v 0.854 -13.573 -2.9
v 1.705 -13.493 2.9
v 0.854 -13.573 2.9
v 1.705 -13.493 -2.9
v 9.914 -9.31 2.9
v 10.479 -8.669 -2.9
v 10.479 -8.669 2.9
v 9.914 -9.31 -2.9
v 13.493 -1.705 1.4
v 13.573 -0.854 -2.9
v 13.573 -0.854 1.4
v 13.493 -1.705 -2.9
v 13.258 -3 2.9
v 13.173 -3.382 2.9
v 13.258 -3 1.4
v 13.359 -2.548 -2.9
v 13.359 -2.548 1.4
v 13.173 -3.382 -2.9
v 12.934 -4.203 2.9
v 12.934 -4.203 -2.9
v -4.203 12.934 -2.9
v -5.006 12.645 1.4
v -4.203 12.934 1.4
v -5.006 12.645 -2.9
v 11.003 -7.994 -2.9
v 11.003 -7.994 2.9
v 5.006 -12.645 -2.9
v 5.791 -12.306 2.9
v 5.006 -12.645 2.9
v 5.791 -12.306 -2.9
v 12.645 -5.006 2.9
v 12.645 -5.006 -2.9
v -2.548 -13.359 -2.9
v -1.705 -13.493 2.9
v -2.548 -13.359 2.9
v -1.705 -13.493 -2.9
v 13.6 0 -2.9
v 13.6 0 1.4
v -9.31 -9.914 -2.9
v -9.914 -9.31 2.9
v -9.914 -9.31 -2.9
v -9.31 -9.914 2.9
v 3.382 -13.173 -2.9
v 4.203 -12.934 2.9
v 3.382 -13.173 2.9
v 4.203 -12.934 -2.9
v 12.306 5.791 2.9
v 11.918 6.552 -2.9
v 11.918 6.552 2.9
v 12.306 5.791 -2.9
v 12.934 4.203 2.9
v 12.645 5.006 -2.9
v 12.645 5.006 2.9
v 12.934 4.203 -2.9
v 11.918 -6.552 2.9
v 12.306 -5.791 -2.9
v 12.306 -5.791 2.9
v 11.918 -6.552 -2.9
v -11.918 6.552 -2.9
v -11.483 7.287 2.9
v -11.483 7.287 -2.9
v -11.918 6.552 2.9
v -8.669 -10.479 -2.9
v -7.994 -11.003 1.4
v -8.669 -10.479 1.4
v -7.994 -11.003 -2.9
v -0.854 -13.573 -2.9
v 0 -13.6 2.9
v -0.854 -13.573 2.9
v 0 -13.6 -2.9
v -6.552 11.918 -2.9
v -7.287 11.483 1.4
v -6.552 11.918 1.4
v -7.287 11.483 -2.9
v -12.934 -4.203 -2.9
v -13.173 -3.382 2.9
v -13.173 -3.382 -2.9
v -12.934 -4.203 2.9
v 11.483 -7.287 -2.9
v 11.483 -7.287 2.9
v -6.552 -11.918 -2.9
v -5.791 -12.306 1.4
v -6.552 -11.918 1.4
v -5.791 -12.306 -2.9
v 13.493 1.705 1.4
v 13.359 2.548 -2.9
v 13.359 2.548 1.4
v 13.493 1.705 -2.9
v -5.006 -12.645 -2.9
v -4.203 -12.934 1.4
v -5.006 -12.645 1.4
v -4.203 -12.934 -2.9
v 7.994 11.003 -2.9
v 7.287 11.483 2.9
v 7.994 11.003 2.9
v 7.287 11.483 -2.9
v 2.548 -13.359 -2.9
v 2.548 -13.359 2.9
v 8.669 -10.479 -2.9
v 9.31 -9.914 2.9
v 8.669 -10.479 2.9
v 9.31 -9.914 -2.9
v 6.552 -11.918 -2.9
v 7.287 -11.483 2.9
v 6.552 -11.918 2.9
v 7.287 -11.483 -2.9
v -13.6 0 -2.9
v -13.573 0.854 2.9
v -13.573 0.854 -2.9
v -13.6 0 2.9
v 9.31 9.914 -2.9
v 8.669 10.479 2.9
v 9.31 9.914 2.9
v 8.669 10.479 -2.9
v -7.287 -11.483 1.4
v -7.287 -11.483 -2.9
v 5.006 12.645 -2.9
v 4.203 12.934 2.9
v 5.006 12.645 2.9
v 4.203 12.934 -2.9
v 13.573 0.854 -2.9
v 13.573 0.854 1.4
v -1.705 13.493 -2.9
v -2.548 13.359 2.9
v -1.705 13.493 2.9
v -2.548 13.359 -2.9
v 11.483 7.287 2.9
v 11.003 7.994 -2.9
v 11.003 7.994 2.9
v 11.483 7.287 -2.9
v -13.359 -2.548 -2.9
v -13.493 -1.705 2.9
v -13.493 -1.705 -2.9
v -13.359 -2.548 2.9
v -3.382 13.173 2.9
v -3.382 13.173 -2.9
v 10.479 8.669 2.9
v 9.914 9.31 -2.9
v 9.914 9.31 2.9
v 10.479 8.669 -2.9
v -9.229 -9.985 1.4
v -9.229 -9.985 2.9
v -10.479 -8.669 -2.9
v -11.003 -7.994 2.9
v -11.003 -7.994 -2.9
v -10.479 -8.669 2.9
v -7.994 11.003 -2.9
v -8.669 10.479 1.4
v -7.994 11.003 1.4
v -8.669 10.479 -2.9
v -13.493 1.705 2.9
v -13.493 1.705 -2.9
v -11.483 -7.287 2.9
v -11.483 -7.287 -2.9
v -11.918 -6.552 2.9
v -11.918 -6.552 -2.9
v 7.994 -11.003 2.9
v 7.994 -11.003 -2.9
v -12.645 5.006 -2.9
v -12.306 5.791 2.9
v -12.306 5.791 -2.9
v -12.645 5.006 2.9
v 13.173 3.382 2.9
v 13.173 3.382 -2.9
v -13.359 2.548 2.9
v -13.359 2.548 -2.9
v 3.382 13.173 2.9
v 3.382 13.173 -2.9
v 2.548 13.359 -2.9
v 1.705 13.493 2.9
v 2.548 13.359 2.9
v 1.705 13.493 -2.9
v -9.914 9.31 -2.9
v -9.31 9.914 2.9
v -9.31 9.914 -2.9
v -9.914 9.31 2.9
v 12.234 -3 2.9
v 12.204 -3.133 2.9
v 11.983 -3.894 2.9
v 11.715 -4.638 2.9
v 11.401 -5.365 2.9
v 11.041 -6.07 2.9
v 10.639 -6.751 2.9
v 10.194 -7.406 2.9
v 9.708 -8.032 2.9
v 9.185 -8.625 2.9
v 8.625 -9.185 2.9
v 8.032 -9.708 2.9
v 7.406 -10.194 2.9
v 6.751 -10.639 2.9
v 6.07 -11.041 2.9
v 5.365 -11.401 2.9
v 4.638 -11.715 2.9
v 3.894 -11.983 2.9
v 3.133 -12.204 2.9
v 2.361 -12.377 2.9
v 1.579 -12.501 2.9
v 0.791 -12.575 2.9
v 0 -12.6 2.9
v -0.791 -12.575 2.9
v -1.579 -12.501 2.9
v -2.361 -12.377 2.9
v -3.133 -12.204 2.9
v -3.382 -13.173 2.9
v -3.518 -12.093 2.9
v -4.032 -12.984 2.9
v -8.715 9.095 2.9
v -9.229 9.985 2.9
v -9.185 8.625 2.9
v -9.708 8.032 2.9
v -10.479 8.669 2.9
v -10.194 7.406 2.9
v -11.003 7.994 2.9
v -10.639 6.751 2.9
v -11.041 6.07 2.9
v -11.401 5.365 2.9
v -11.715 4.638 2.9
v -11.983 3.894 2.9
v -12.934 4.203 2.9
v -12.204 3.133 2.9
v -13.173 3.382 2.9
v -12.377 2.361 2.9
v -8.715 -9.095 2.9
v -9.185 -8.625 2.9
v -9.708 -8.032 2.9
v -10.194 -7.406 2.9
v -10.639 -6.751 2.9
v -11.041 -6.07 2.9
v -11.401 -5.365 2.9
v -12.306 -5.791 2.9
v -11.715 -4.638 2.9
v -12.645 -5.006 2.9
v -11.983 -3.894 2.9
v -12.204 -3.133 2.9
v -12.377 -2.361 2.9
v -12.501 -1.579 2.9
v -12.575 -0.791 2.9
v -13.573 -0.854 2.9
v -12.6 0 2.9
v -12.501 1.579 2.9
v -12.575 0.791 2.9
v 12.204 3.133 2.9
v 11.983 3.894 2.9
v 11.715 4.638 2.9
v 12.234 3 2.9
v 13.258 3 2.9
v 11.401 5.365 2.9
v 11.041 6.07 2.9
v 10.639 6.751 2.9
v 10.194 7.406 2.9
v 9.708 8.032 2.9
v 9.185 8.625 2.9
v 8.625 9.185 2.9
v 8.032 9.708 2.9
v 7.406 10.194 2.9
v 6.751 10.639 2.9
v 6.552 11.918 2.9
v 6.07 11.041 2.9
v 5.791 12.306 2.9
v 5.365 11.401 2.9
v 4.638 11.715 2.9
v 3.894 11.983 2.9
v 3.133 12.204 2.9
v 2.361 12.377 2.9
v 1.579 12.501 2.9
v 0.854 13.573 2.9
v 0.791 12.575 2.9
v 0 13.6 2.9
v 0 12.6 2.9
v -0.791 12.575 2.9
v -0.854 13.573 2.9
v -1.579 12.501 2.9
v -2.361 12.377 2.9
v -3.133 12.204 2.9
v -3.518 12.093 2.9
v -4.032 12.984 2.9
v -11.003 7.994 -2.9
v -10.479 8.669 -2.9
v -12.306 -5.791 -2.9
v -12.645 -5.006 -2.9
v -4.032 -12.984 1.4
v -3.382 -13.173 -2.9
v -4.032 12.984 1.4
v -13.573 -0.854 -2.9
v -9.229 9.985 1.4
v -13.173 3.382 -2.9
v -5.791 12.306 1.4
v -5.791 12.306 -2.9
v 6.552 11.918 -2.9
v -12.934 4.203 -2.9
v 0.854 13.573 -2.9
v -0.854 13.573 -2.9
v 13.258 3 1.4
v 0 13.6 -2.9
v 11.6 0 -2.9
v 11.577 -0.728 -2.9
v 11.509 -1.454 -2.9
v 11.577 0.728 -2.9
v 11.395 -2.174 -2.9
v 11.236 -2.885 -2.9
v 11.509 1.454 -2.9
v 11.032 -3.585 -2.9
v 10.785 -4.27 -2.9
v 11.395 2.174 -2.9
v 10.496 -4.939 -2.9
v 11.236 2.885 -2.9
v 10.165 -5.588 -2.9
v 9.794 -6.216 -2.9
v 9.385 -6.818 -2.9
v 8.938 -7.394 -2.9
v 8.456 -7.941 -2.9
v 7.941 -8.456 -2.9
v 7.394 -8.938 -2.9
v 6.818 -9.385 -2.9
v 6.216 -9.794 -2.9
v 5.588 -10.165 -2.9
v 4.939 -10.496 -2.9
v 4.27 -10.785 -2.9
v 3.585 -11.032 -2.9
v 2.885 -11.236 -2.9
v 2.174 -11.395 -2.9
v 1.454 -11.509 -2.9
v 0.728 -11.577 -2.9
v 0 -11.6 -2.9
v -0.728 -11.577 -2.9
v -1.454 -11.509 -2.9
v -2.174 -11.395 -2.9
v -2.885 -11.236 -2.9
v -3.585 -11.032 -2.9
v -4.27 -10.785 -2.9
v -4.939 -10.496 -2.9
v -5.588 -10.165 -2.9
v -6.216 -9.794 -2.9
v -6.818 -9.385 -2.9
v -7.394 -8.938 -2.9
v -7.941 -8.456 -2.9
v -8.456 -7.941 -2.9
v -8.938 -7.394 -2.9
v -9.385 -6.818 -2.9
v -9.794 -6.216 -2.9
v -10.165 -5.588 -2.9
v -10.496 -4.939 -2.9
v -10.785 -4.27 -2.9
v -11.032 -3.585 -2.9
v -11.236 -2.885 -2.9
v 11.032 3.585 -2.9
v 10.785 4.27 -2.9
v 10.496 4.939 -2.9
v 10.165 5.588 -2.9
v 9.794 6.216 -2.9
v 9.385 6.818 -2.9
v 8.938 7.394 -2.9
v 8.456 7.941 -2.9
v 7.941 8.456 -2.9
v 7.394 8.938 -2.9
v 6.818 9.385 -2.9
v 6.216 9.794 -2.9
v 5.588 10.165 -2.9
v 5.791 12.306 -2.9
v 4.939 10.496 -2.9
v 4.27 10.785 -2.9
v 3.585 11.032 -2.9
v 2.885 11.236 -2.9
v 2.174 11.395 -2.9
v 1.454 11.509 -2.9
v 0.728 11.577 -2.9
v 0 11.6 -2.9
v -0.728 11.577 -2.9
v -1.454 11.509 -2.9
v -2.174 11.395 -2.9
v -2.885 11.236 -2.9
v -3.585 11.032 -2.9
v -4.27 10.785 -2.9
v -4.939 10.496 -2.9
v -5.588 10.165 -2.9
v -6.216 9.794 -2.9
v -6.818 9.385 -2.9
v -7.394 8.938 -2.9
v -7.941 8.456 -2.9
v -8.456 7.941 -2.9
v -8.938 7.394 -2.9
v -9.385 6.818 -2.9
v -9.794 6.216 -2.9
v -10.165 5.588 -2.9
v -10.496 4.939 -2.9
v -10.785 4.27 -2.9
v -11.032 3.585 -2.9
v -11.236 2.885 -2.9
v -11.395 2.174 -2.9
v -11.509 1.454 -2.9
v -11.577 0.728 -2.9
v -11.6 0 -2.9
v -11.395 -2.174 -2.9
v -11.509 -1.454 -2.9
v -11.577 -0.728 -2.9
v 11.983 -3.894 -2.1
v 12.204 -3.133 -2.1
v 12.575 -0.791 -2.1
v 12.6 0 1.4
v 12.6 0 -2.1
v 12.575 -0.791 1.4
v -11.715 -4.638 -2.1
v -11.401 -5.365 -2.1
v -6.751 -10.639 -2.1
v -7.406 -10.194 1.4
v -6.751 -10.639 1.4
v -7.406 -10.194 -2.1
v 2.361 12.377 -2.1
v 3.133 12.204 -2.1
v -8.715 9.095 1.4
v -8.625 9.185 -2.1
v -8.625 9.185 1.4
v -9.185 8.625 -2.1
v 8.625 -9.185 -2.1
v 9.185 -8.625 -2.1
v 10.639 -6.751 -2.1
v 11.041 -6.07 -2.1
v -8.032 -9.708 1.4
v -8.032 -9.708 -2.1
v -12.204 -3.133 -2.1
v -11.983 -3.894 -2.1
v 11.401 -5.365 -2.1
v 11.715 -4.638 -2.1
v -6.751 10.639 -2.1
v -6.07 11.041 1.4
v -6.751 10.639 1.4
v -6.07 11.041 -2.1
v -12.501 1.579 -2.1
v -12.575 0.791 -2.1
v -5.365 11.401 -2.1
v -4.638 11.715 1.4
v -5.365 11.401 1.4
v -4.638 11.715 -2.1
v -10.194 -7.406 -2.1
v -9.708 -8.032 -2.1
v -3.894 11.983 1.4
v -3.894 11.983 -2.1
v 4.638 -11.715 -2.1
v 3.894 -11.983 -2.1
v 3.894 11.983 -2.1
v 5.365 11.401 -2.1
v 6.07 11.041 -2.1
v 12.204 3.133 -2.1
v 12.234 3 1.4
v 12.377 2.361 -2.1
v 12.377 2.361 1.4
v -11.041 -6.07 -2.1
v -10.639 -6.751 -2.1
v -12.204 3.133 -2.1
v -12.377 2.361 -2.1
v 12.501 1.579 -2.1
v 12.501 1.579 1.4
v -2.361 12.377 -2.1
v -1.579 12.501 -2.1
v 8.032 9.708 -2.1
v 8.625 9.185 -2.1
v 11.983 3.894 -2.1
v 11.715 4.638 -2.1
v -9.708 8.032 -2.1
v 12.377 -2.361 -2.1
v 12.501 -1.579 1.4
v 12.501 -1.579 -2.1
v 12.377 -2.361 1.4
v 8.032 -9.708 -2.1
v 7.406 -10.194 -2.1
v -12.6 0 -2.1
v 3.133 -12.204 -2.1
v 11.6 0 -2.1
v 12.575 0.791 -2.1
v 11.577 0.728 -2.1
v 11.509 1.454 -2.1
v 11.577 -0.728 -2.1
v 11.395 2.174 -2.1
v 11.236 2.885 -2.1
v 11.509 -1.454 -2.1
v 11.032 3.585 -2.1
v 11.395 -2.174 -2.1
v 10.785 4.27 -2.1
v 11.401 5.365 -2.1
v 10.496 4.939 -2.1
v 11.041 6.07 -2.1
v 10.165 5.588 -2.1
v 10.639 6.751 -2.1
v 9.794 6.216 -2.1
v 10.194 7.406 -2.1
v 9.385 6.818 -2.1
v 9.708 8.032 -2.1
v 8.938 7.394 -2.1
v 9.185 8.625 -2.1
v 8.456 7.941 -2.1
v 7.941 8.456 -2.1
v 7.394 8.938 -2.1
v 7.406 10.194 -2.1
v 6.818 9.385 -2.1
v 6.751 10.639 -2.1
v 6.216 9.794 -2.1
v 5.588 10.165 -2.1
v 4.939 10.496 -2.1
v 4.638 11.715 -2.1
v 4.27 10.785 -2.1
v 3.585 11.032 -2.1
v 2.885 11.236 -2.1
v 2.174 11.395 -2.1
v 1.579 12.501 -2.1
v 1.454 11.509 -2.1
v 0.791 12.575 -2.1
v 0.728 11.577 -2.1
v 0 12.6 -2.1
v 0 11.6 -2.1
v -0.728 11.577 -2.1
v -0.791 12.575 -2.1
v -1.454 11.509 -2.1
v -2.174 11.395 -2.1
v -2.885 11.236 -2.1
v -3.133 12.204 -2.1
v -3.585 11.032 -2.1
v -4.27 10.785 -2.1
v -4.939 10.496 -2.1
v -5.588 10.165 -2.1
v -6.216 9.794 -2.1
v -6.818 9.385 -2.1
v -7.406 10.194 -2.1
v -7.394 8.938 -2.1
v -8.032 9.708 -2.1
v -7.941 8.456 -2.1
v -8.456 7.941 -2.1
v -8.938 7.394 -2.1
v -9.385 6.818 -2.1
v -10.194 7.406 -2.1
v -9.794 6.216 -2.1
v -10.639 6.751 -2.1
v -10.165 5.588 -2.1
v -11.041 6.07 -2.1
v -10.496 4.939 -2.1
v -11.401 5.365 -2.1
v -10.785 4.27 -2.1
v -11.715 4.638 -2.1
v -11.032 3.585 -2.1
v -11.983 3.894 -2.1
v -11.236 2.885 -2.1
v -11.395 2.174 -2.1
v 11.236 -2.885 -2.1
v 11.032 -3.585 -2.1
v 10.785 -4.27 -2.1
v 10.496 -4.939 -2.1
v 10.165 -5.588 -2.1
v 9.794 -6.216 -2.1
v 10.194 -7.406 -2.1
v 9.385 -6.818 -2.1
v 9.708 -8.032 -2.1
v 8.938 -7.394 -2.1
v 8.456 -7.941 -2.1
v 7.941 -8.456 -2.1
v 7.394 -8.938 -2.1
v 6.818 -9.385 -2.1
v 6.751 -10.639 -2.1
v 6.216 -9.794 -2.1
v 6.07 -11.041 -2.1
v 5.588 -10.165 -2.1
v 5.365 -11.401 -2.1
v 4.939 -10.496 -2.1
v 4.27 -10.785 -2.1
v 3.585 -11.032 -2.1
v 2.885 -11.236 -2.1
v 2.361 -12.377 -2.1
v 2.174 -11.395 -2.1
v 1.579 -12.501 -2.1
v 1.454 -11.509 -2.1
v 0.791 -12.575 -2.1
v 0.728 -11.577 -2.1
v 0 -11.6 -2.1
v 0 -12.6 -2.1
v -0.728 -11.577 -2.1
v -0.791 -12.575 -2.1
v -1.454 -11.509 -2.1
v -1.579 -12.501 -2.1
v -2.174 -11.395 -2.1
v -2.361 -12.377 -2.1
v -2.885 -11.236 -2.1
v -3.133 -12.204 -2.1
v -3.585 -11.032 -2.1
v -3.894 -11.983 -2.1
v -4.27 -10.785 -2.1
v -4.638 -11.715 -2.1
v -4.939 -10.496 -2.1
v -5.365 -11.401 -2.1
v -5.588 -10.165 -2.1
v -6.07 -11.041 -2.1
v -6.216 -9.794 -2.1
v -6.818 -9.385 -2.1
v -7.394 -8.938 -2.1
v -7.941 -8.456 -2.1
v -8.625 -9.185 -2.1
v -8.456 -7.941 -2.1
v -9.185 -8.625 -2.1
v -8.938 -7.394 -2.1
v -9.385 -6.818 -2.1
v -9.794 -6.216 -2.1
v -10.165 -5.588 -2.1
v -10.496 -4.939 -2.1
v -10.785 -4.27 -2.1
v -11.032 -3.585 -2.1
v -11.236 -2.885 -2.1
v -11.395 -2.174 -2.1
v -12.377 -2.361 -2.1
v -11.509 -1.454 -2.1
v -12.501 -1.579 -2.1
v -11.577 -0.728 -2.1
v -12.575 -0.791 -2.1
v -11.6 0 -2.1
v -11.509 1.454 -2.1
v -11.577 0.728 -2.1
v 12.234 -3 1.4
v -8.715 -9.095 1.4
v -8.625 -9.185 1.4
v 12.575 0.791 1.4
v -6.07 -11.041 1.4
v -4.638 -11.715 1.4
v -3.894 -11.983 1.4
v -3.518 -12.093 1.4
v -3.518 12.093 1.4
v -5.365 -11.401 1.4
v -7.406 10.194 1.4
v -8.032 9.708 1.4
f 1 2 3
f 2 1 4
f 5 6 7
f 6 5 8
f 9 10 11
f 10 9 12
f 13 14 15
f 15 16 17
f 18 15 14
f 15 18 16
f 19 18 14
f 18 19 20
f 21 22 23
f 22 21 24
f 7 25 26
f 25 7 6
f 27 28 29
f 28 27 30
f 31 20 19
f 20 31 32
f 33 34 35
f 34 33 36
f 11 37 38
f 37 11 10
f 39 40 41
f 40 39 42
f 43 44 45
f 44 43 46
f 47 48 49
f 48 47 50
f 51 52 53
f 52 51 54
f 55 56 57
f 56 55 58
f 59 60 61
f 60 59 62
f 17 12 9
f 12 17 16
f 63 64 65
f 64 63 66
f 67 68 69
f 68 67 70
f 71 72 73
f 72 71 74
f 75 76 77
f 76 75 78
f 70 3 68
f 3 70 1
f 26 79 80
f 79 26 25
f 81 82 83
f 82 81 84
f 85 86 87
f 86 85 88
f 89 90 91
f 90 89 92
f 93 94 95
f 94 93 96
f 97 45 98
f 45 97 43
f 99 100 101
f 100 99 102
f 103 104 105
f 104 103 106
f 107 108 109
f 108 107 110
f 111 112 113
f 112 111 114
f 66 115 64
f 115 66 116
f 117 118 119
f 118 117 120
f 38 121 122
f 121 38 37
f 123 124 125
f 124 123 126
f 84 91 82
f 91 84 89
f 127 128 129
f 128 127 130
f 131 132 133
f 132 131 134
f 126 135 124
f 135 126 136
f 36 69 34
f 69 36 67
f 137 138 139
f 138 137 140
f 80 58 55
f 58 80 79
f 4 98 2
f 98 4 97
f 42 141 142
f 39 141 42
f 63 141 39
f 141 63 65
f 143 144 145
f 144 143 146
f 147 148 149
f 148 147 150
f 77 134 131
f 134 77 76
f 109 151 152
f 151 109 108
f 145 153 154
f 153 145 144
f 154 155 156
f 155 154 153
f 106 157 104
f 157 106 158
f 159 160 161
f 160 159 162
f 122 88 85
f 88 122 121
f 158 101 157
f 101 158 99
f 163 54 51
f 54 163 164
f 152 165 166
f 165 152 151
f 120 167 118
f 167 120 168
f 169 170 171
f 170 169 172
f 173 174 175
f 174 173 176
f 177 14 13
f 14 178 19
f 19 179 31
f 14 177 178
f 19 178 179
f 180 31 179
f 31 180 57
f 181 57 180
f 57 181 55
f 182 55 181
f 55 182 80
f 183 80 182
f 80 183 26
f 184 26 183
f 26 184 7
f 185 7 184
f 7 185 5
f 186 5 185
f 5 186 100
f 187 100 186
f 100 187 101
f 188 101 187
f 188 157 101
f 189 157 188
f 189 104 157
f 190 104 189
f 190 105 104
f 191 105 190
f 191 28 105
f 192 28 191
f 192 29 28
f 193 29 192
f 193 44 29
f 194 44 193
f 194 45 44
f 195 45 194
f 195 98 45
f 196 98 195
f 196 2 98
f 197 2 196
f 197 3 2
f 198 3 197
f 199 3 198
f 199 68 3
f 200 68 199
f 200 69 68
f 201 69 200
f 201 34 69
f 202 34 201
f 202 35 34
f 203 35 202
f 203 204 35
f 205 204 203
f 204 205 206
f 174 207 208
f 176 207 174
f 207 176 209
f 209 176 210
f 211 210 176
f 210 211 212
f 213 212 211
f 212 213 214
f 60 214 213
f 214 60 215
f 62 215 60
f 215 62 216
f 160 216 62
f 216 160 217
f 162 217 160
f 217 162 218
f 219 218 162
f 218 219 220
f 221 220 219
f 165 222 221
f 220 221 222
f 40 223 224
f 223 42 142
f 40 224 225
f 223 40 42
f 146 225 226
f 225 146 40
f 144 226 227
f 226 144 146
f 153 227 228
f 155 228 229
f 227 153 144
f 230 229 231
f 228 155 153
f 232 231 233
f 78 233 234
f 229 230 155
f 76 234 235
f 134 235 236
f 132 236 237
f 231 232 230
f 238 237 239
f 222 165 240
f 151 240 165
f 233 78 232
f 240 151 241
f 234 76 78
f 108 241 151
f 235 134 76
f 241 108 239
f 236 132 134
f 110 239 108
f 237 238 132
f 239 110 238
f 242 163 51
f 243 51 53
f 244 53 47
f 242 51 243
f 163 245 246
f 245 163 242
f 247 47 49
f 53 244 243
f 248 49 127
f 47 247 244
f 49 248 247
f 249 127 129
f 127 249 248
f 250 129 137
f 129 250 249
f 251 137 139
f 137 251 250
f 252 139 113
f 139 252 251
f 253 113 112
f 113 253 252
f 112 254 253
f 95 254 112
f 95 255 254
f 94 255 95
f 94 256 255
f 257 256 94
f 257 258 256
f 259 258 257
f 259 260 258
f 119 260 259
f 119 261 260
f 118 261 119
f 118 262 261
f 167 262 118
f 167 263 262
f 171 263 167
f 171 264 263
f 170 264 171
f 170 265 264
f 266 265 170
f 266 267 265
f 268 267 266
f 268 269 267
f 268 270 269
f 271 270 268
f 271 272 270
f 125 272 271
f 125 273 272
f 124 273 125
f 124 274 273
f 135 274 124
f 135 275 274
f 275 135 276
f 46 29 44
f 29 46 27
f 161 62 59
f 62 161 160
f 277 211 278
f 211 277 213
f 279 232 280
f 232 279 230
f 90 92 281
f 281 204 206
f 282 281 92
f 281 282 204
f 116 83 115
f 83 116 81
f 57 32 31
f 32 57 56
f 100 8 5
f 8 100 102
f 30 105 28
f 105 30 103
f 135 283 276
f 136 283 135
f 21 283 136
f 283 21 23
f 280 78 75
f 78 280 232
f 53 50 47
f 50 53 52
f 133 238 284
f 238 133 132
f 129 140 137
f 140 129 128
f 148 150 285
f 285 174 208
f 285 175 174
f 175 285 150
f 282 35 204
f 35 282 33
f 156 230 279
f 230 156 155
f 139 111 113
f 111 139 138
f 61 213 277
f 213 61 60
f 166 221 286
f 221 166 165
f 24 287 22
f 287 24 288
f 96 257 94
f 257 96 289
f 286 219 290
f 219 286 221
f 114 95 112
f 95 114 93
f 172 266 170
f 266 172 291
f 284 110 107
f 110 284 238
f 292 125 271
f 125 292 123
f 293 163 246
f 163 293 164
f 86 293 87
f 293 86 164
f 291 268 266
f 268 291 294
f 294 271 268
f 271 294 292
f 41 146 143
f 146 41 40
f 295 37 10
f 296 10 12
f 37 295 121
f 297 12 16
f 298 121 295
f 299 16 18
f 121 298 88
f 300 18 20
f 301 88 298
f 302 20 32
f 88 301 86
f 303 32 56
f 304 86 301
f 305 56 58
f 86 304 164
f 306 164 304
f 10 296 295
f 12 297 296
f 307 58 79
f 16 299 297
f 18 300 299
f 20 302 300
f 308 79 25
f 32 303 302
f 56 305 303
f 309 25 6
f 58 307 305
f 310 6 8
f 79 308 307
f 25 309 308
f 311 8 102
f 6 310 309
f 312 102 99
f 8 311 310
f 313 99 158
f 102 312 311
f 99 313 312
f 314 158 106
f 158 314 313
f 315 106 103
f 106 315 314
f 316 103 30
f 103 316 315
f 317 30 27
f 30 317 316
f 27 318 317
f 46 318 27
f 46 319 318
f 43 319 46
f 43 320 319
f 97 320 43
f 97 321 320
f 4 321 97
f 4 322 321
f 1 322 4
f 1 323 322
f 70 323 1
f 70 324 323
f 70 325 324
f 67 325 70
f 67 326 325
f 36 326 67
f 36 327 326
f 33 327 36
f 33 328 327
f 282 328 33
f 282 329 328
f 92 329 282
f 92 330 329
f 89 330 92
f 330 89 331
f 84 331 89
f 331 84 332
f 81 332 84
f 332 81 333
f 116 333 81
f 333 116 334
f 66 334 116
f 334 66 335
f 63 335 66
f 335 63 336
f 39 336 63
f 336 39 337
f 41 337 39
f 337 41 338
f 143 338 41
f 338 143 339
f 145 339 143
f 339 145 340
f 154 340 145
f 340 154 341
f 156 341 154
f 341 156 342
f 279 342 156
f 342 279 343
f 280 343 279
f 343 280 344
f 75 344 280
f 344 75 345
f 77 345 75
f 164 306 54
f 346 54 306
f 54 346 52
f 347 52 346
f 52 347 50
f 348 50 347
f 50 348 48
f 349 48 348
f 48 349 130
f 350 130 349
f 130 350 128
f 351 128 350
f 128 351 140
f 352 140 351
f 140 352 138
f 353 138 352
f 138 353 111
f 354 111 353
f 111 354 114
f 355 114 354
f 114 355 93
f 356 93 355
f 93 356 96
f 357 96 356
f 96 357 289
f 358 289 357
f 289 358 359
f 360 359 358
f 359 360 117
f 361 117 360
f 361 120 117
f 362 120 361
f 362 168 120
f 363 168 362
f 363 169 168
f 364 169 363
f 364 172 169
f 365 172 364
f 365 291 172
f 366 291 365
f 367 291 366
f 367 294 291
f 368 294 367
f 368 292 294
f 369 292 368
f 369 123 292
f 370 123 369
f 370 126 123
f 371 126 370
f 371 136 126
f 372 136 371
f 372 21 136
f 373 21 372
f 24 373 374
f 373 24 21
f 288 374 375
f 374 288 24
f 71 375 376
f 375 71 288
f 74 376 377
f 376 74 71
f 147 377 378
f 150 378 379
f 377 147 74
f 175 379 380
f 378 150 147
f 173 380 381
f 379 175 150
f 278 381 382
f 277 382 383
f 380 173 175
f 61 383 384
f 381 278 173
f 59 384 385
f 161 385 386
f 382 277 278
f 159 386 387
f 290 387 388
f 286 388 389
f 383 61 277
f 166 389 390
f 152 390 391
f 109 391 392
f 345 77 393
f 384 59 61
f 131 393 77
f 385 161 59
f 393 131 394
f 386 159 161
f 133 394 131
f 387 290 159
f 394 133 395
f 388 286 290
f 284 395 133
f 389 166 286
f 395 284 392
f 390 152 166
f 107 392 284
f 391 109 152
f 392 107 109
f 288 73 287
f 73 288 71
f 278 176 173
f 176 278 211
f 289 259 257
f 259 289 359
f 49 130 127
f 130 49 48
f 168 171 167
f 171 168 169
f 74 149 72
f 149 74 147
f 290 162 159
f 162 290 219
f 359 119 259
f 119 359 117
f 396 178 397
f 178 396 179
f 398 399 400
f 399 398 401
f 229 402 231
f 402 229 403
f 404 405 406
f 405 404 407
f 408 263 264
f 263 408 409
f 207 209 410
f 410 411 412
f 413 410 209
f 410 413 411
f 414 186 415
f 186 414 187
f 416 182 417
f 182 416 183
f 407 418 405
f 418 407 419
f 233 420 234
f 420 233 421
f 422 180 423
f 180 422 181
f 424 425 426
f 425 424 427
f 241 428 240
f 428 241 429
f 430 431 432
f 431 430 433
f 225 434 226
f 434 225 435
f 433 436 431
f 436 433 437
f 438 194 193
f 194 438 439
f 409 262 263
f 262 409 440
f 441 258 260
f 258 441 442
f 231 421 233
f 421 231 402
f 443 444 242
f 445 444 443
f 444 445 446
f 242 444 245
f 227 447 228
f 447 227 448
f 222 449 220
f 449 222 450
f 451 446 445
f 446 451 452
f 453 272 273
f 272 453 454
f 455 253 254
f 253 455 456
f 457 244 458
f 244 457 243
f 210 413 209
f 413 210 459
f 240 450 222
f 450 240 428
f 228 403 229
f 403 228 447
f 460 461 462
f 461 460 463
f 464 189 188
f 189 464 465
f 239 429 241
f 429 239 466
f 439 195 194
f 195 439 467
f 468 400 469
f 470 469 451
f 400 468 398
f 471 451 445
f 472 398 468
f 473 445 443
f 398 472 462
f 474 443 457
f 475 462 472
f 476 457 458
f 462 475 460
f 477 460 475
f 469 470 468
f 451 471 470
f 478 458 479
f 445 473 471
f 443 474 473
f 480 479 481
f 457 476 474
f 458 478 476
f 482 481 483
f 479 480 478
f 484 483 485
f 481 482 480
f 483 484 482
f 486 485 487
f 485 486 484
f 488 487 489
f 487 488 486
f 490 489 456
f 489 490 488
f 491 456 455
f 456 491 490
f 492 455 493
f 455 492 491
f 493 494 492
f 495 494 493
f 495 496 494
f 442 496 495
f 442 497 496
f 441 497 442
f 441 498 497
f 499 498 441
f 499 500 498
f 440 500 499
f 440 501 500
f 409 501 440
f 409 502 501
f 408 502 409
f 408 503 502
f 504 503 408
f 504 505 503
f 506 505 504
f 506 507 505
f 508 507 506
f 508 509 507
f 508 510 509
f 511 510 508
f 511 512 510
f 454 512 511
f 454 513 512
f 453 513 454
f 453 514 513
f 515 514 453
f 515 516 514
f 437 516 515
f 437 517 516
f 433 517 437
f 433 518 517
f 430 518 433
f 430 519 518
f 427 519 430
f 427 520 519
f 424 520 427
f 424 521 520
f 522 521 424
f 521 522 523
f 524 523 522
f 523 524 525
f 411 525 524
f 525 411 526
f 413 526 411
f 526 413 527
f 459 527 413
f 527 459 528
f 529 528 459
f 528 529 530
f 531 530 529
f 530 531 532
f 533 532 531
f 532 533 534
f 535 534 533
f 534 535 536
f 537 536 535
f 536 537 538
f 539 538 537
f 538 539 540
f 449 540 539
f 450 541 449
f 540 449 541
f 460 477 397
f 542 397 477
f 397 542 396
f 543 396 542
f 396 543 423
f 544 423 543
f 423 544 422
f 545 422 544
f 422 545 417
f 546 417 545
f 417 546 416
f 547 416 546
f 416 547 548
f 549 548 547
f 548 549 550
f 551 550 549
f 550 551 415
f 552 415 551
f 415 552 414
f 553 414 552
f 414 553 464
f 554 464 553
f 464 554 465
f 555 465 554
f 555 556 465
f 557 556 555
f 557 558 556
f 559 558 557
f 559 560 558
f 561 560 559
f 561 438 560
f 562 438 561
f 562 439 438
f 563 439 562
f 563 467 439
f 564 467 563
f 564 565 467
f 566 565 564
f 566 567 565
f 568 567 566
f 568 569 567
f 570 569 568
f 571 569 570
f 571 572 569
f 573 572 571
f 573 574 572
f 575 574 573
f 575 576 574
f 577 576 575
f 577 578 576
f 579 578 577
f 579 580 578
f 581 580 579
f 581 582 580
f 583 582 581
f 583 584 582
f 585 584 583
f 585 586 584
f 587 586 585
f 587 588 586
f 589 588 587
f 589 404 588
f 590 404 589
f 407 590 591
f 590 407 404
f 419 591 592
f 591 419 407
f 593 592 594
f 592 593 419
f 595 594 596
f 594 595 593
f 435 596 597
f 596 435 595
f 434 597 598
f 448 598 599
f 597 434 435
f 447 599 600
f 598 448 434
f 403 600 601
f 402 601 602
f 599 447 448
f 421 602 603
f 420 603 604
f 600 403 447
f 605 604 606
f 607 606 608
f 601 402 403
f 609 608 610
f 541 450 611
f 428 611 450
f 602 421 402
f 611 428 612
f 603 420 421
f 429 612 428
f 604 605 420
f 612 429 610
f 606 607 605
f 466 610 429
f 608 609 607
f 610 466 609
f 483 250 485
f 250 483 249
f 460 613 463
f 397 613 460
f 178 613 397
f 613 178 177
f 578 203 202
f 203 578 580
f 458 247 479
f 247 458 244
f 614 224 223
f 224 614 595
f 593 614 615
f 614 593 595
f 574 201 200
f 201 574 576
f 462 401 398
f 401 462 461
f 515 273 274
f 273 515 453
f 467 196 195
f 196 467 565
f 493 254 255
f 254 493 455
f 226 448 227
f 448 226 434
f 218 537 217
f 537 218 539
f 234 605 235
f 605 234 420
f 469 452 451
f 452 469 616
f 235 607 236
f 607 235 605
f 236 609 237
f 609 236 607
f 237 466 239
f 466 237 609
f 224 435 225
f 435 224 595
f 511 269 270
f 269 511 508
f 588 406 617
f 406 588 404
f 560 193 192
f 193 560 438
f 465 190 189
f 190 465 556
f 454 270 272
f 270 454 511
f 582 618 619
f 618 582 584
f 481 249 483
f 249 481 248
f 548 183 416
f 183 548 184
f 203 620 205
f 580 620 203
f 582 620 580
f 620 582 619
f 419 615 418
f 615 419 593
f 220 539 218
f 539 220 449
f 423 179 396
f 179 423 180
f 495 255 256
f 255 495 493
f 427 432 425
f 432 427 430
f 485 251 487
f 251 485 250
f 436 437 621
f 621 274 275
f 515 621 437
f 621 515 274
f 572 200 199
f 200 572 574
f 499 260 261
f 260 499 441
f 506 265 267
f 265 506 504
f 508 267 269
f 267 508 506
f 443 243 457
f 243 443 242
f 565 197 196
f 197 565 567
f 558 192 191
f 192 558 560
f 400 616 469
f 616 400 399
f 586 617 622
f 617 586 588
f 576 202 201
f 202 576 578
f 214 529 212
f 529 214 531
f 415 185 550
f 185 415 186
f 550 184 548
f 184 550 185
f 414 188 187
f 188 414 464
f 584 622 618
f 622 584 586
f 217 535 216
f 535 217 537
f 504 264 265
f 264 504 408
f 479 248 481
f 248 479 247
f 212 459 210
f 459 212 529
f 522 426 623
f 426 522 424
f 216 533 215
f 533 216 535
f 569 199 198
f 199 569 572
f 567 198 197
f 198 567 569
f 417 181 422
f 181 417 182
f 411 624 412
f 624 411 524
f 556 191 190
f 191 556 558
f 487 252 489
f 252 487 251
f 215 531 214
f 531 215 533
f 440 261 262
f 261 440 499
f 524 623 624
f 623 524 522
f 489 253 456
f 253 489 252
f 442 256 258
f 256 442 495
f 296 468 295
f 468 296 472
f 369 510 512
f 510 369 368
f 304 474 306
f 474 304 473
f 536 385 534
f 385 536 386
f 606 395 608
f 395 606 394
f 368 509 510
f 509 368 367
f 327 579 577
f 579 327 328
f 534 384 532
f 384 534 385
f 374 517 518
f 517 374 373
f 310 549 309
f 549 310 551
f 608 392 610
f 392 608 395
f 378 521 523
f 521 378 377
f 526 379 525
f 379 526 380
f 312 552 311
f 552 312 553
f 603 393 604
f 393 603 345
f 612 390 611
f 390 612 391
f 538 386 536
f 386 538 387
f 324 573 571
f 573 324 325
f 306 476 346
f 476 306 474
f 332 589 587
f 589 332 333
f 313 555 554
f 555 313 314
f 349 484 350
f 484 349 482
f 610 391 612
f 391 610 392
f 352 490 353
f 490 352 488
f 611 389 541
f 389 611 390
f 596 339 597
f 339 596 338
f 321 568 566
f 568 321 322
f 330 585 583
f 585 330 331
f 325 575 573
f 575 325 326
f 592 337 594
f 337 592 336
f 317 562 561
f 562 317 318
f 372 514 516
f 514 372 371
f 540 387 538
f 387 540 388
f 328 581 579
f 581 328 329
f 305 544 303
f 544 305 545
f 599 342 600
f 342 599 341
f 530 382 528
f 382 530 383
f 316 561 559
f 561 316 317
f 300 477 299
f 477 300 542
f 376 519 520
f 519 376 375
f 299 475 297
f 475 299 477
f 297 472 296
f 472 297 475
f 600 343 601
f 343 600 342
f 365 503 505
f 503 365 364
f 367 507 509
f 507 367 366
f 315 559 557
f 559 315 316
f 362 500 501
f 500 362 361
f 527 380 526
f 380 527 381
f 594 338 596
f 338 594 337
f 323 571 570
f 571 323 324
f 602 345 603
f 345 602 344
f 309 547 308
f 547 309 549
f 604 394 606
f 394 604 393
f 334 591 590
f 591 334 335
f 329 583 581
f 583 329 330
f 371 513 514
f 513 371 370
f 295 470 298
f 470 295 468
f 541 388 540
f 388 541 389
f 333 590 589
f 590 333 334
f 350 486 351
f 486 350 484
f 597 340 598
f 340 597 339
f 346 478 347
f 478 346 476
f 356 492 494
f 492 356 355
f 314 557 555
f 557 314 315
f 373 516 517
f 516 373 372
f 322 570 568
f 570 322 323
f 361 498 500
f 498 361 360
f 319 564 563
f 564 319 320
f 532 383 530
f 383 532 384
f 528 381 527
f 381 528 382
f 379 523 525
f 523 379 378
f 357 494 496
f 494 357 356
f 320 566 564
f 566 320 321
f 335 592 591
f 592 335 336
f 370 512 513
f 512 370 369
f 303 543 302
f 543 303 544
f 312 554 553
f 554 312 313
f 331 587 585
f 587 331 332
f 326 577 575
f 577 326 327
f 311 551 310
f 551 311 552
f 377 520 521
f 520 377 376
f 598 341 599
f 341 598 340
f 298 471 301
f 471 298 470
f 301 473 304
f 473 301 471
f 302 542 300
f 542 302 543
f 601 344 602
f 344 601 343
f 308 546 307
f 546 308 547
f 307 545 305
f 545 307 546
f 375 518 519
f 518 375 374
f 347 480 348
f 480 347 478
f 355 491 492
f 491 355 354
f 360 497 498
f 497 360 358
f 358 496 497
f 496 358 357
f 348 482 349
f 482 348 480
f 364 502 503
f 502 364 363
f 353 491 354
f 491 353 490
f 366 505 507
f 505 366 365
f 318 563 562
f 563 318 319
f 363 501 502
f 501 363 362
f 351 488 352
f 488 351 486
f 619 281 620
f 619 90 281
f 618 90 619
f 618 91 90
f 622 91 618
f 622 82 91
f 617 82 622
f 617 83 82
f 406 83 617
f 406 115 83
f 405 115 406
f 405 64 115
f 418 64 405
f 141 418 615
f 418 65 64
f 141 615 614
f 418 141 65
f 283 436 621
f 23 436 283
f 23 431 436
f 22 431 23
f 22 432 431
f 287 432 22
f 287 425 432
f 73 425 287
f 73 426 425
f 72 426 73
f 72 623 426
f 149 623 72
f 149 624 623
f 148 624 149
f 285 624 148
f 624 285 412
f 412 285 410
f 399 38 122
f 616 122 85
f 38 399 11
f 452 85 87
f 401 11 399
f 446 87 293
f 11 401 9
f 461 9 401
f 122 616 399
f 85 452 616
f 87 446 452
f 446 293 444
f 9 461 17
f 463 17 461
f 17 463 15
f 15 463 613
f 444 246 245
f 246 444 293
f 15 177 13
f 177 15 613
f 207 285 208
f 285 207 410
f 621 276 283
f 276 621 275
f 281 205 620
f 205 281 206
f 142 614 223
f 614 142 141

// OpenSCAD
/*
    
    With this code you can make a filter holder to attach it to the lens focus wheel used for the camera in the FluoPi project.
    
    Isaac Núñez 2020 (CC BY 4.0; https://creativecommons.org/licenses/by/4.0/) 
 
*/

////////////////
// Parameters //


rf = 12.6;   //filter radius
side_thick = 1 ;
filter_thick = 3;
filter_free_space = 0.5; // in z axis, between the filter and the lens 
bottom_thick = 0.8; //the layer that support the filter
sheet = 1; // sheet tickness to support the filter

ri = rf-sheet; // internal hole radius
re = rf +side_thick; // External radius

h_fs = filter_thick +filter_free_space + bottom_thick; //base filter support heigh

// HQ camera
r_hq = 15; // HQ camera radius
h_ring = 3; // Height of the ring attached to the camera

// Clamp support system for waveshare camera
h_clam = 2;
free_clam_space = 10;
angles1 = [0,120,240];
angles2 = [15,135,255];

h_WS = h_fs + h_clam; // for waveshare


///////////////////
// RPI V2 camera //
///////////////////

RPIV2_cam_x = 25 + 0.5 ; // 0.5 mm of error
RPIV2_cam_y = 24 + 0.5;  // 0.5 mm of error
RPIV2_cam_z = 6; //Lens height over the PCB

h_ext = 2; // external height to cover the PCB
e_tick = 1; // enclosure tickness

scw_r = 1; //screw radius
len_xy = 8.5; // lens base X and Y wide
lbd = 5; // lens distance from bottom
V2_scw_b = 9.25;  // distance from bottom to screw hole center
V2_scw_s = 2; // distance from side to screw hole center


V2_h_clam = 1.5;
V2_fc_space = 6;
V2_angles = [0,120,240];

h_V2 = h_fs + V2_h_clam; // for RPI_V2


////////////////////////////////////

module clam_space(length, wide, thickness, angles){

    for(ang = angles){
       rotate([0,0,ang])
       translate([length/2, 0, 0])
       cube([length, wide, thickness], center = true);
    }
}



////////////////////////
// Create the holder //

module filter_support(h){
    difference(){
        linear_extrude(height = h, center = true, convexity = 10, twist = 0,$fn = 100)
        circle(re);
        
        //filter space
        translate([0,0,bottom_thick])
        linear_extrude(height = h, center = true, convexity = 10, twist = 0,$fn = 100)
        circle(rf);
        
        //Central hole    
        translate([0,0,-bottom_thick])       linear_extrude(height = h, center = true, convexity = 10, twist = 0,$fn = 100)
        circle(ri);
    }
}

module fsup_WS_clamp(h){
    difference(){
        
        filter_support(h);
        
        // Clamp system
        translate([0,0,h/2-h_clam/2 - h_clam/4]) 
        clam_space(re*1.5, free_clam_space ,h_clam/2, angles1);

        translate([0,0,h/2-0.8*h_clam/2.1])  
        intersection() {

            clam_space(re*1.5, free_clam_space ,h_clam*0.8, angles1);

            clam_space(re*1.5, free_clam_space ,h_clam*0.8, angles2);
        }
    }
}

module fsup_HQ(h){
    
    r_hqc = r_hq + 0.1; // plus lossenes correction 
    h_total = h + bottom_thick + h_ring;
    re_hqe = r_hqc+side_thick; // external radius HQ enclosure
    t_ur = re_hqe - re; // thickness of the union ring 
    
    difference(){
        union(){
            filter_support(h);
            
            //union "ring"
            translate([0,0,h/2-bottom_thick])
            rotate_extrude(convexity = 5, $fn = 100)
            translate([re,0,0])
            polygon(points=[[0,0],[0,bottom_thick],[t_ur,bottom_thick]]);
            
            //ring attached to HQ camera
            translate([0,0,(h+h_ring)/2])
            difference(){
                cylinder(h=h_ring, r=r_hqc+side_thick, $fn=100, center =true);
                cylinder(h=h_ring, r=r_hqc, $fn=100, center =true);
            }
            }
    //central hole
    translate([0,0,bottom_thick+h/2])         
    cylinder(h=h_total, r=rf, $fn=100, center =true);  
    }

}

module fsup_rpiv2(h){
    difference(){
        
        filter_support(h);
        
        // Clamp system
        translate([0,0,h/2-V2_h_clam/2 ]) 
        clam_space(re*1.5, V2_fc_space ,V2_h_clam, V2_angles);

        
    }
}

// Uncomment the module you wanna generate
//fsup_WS_clamp(h_WS);
//filter_support(h_WS);
//fsup_HQ(h_fs);
fsup_rpiv2(h_V2);
